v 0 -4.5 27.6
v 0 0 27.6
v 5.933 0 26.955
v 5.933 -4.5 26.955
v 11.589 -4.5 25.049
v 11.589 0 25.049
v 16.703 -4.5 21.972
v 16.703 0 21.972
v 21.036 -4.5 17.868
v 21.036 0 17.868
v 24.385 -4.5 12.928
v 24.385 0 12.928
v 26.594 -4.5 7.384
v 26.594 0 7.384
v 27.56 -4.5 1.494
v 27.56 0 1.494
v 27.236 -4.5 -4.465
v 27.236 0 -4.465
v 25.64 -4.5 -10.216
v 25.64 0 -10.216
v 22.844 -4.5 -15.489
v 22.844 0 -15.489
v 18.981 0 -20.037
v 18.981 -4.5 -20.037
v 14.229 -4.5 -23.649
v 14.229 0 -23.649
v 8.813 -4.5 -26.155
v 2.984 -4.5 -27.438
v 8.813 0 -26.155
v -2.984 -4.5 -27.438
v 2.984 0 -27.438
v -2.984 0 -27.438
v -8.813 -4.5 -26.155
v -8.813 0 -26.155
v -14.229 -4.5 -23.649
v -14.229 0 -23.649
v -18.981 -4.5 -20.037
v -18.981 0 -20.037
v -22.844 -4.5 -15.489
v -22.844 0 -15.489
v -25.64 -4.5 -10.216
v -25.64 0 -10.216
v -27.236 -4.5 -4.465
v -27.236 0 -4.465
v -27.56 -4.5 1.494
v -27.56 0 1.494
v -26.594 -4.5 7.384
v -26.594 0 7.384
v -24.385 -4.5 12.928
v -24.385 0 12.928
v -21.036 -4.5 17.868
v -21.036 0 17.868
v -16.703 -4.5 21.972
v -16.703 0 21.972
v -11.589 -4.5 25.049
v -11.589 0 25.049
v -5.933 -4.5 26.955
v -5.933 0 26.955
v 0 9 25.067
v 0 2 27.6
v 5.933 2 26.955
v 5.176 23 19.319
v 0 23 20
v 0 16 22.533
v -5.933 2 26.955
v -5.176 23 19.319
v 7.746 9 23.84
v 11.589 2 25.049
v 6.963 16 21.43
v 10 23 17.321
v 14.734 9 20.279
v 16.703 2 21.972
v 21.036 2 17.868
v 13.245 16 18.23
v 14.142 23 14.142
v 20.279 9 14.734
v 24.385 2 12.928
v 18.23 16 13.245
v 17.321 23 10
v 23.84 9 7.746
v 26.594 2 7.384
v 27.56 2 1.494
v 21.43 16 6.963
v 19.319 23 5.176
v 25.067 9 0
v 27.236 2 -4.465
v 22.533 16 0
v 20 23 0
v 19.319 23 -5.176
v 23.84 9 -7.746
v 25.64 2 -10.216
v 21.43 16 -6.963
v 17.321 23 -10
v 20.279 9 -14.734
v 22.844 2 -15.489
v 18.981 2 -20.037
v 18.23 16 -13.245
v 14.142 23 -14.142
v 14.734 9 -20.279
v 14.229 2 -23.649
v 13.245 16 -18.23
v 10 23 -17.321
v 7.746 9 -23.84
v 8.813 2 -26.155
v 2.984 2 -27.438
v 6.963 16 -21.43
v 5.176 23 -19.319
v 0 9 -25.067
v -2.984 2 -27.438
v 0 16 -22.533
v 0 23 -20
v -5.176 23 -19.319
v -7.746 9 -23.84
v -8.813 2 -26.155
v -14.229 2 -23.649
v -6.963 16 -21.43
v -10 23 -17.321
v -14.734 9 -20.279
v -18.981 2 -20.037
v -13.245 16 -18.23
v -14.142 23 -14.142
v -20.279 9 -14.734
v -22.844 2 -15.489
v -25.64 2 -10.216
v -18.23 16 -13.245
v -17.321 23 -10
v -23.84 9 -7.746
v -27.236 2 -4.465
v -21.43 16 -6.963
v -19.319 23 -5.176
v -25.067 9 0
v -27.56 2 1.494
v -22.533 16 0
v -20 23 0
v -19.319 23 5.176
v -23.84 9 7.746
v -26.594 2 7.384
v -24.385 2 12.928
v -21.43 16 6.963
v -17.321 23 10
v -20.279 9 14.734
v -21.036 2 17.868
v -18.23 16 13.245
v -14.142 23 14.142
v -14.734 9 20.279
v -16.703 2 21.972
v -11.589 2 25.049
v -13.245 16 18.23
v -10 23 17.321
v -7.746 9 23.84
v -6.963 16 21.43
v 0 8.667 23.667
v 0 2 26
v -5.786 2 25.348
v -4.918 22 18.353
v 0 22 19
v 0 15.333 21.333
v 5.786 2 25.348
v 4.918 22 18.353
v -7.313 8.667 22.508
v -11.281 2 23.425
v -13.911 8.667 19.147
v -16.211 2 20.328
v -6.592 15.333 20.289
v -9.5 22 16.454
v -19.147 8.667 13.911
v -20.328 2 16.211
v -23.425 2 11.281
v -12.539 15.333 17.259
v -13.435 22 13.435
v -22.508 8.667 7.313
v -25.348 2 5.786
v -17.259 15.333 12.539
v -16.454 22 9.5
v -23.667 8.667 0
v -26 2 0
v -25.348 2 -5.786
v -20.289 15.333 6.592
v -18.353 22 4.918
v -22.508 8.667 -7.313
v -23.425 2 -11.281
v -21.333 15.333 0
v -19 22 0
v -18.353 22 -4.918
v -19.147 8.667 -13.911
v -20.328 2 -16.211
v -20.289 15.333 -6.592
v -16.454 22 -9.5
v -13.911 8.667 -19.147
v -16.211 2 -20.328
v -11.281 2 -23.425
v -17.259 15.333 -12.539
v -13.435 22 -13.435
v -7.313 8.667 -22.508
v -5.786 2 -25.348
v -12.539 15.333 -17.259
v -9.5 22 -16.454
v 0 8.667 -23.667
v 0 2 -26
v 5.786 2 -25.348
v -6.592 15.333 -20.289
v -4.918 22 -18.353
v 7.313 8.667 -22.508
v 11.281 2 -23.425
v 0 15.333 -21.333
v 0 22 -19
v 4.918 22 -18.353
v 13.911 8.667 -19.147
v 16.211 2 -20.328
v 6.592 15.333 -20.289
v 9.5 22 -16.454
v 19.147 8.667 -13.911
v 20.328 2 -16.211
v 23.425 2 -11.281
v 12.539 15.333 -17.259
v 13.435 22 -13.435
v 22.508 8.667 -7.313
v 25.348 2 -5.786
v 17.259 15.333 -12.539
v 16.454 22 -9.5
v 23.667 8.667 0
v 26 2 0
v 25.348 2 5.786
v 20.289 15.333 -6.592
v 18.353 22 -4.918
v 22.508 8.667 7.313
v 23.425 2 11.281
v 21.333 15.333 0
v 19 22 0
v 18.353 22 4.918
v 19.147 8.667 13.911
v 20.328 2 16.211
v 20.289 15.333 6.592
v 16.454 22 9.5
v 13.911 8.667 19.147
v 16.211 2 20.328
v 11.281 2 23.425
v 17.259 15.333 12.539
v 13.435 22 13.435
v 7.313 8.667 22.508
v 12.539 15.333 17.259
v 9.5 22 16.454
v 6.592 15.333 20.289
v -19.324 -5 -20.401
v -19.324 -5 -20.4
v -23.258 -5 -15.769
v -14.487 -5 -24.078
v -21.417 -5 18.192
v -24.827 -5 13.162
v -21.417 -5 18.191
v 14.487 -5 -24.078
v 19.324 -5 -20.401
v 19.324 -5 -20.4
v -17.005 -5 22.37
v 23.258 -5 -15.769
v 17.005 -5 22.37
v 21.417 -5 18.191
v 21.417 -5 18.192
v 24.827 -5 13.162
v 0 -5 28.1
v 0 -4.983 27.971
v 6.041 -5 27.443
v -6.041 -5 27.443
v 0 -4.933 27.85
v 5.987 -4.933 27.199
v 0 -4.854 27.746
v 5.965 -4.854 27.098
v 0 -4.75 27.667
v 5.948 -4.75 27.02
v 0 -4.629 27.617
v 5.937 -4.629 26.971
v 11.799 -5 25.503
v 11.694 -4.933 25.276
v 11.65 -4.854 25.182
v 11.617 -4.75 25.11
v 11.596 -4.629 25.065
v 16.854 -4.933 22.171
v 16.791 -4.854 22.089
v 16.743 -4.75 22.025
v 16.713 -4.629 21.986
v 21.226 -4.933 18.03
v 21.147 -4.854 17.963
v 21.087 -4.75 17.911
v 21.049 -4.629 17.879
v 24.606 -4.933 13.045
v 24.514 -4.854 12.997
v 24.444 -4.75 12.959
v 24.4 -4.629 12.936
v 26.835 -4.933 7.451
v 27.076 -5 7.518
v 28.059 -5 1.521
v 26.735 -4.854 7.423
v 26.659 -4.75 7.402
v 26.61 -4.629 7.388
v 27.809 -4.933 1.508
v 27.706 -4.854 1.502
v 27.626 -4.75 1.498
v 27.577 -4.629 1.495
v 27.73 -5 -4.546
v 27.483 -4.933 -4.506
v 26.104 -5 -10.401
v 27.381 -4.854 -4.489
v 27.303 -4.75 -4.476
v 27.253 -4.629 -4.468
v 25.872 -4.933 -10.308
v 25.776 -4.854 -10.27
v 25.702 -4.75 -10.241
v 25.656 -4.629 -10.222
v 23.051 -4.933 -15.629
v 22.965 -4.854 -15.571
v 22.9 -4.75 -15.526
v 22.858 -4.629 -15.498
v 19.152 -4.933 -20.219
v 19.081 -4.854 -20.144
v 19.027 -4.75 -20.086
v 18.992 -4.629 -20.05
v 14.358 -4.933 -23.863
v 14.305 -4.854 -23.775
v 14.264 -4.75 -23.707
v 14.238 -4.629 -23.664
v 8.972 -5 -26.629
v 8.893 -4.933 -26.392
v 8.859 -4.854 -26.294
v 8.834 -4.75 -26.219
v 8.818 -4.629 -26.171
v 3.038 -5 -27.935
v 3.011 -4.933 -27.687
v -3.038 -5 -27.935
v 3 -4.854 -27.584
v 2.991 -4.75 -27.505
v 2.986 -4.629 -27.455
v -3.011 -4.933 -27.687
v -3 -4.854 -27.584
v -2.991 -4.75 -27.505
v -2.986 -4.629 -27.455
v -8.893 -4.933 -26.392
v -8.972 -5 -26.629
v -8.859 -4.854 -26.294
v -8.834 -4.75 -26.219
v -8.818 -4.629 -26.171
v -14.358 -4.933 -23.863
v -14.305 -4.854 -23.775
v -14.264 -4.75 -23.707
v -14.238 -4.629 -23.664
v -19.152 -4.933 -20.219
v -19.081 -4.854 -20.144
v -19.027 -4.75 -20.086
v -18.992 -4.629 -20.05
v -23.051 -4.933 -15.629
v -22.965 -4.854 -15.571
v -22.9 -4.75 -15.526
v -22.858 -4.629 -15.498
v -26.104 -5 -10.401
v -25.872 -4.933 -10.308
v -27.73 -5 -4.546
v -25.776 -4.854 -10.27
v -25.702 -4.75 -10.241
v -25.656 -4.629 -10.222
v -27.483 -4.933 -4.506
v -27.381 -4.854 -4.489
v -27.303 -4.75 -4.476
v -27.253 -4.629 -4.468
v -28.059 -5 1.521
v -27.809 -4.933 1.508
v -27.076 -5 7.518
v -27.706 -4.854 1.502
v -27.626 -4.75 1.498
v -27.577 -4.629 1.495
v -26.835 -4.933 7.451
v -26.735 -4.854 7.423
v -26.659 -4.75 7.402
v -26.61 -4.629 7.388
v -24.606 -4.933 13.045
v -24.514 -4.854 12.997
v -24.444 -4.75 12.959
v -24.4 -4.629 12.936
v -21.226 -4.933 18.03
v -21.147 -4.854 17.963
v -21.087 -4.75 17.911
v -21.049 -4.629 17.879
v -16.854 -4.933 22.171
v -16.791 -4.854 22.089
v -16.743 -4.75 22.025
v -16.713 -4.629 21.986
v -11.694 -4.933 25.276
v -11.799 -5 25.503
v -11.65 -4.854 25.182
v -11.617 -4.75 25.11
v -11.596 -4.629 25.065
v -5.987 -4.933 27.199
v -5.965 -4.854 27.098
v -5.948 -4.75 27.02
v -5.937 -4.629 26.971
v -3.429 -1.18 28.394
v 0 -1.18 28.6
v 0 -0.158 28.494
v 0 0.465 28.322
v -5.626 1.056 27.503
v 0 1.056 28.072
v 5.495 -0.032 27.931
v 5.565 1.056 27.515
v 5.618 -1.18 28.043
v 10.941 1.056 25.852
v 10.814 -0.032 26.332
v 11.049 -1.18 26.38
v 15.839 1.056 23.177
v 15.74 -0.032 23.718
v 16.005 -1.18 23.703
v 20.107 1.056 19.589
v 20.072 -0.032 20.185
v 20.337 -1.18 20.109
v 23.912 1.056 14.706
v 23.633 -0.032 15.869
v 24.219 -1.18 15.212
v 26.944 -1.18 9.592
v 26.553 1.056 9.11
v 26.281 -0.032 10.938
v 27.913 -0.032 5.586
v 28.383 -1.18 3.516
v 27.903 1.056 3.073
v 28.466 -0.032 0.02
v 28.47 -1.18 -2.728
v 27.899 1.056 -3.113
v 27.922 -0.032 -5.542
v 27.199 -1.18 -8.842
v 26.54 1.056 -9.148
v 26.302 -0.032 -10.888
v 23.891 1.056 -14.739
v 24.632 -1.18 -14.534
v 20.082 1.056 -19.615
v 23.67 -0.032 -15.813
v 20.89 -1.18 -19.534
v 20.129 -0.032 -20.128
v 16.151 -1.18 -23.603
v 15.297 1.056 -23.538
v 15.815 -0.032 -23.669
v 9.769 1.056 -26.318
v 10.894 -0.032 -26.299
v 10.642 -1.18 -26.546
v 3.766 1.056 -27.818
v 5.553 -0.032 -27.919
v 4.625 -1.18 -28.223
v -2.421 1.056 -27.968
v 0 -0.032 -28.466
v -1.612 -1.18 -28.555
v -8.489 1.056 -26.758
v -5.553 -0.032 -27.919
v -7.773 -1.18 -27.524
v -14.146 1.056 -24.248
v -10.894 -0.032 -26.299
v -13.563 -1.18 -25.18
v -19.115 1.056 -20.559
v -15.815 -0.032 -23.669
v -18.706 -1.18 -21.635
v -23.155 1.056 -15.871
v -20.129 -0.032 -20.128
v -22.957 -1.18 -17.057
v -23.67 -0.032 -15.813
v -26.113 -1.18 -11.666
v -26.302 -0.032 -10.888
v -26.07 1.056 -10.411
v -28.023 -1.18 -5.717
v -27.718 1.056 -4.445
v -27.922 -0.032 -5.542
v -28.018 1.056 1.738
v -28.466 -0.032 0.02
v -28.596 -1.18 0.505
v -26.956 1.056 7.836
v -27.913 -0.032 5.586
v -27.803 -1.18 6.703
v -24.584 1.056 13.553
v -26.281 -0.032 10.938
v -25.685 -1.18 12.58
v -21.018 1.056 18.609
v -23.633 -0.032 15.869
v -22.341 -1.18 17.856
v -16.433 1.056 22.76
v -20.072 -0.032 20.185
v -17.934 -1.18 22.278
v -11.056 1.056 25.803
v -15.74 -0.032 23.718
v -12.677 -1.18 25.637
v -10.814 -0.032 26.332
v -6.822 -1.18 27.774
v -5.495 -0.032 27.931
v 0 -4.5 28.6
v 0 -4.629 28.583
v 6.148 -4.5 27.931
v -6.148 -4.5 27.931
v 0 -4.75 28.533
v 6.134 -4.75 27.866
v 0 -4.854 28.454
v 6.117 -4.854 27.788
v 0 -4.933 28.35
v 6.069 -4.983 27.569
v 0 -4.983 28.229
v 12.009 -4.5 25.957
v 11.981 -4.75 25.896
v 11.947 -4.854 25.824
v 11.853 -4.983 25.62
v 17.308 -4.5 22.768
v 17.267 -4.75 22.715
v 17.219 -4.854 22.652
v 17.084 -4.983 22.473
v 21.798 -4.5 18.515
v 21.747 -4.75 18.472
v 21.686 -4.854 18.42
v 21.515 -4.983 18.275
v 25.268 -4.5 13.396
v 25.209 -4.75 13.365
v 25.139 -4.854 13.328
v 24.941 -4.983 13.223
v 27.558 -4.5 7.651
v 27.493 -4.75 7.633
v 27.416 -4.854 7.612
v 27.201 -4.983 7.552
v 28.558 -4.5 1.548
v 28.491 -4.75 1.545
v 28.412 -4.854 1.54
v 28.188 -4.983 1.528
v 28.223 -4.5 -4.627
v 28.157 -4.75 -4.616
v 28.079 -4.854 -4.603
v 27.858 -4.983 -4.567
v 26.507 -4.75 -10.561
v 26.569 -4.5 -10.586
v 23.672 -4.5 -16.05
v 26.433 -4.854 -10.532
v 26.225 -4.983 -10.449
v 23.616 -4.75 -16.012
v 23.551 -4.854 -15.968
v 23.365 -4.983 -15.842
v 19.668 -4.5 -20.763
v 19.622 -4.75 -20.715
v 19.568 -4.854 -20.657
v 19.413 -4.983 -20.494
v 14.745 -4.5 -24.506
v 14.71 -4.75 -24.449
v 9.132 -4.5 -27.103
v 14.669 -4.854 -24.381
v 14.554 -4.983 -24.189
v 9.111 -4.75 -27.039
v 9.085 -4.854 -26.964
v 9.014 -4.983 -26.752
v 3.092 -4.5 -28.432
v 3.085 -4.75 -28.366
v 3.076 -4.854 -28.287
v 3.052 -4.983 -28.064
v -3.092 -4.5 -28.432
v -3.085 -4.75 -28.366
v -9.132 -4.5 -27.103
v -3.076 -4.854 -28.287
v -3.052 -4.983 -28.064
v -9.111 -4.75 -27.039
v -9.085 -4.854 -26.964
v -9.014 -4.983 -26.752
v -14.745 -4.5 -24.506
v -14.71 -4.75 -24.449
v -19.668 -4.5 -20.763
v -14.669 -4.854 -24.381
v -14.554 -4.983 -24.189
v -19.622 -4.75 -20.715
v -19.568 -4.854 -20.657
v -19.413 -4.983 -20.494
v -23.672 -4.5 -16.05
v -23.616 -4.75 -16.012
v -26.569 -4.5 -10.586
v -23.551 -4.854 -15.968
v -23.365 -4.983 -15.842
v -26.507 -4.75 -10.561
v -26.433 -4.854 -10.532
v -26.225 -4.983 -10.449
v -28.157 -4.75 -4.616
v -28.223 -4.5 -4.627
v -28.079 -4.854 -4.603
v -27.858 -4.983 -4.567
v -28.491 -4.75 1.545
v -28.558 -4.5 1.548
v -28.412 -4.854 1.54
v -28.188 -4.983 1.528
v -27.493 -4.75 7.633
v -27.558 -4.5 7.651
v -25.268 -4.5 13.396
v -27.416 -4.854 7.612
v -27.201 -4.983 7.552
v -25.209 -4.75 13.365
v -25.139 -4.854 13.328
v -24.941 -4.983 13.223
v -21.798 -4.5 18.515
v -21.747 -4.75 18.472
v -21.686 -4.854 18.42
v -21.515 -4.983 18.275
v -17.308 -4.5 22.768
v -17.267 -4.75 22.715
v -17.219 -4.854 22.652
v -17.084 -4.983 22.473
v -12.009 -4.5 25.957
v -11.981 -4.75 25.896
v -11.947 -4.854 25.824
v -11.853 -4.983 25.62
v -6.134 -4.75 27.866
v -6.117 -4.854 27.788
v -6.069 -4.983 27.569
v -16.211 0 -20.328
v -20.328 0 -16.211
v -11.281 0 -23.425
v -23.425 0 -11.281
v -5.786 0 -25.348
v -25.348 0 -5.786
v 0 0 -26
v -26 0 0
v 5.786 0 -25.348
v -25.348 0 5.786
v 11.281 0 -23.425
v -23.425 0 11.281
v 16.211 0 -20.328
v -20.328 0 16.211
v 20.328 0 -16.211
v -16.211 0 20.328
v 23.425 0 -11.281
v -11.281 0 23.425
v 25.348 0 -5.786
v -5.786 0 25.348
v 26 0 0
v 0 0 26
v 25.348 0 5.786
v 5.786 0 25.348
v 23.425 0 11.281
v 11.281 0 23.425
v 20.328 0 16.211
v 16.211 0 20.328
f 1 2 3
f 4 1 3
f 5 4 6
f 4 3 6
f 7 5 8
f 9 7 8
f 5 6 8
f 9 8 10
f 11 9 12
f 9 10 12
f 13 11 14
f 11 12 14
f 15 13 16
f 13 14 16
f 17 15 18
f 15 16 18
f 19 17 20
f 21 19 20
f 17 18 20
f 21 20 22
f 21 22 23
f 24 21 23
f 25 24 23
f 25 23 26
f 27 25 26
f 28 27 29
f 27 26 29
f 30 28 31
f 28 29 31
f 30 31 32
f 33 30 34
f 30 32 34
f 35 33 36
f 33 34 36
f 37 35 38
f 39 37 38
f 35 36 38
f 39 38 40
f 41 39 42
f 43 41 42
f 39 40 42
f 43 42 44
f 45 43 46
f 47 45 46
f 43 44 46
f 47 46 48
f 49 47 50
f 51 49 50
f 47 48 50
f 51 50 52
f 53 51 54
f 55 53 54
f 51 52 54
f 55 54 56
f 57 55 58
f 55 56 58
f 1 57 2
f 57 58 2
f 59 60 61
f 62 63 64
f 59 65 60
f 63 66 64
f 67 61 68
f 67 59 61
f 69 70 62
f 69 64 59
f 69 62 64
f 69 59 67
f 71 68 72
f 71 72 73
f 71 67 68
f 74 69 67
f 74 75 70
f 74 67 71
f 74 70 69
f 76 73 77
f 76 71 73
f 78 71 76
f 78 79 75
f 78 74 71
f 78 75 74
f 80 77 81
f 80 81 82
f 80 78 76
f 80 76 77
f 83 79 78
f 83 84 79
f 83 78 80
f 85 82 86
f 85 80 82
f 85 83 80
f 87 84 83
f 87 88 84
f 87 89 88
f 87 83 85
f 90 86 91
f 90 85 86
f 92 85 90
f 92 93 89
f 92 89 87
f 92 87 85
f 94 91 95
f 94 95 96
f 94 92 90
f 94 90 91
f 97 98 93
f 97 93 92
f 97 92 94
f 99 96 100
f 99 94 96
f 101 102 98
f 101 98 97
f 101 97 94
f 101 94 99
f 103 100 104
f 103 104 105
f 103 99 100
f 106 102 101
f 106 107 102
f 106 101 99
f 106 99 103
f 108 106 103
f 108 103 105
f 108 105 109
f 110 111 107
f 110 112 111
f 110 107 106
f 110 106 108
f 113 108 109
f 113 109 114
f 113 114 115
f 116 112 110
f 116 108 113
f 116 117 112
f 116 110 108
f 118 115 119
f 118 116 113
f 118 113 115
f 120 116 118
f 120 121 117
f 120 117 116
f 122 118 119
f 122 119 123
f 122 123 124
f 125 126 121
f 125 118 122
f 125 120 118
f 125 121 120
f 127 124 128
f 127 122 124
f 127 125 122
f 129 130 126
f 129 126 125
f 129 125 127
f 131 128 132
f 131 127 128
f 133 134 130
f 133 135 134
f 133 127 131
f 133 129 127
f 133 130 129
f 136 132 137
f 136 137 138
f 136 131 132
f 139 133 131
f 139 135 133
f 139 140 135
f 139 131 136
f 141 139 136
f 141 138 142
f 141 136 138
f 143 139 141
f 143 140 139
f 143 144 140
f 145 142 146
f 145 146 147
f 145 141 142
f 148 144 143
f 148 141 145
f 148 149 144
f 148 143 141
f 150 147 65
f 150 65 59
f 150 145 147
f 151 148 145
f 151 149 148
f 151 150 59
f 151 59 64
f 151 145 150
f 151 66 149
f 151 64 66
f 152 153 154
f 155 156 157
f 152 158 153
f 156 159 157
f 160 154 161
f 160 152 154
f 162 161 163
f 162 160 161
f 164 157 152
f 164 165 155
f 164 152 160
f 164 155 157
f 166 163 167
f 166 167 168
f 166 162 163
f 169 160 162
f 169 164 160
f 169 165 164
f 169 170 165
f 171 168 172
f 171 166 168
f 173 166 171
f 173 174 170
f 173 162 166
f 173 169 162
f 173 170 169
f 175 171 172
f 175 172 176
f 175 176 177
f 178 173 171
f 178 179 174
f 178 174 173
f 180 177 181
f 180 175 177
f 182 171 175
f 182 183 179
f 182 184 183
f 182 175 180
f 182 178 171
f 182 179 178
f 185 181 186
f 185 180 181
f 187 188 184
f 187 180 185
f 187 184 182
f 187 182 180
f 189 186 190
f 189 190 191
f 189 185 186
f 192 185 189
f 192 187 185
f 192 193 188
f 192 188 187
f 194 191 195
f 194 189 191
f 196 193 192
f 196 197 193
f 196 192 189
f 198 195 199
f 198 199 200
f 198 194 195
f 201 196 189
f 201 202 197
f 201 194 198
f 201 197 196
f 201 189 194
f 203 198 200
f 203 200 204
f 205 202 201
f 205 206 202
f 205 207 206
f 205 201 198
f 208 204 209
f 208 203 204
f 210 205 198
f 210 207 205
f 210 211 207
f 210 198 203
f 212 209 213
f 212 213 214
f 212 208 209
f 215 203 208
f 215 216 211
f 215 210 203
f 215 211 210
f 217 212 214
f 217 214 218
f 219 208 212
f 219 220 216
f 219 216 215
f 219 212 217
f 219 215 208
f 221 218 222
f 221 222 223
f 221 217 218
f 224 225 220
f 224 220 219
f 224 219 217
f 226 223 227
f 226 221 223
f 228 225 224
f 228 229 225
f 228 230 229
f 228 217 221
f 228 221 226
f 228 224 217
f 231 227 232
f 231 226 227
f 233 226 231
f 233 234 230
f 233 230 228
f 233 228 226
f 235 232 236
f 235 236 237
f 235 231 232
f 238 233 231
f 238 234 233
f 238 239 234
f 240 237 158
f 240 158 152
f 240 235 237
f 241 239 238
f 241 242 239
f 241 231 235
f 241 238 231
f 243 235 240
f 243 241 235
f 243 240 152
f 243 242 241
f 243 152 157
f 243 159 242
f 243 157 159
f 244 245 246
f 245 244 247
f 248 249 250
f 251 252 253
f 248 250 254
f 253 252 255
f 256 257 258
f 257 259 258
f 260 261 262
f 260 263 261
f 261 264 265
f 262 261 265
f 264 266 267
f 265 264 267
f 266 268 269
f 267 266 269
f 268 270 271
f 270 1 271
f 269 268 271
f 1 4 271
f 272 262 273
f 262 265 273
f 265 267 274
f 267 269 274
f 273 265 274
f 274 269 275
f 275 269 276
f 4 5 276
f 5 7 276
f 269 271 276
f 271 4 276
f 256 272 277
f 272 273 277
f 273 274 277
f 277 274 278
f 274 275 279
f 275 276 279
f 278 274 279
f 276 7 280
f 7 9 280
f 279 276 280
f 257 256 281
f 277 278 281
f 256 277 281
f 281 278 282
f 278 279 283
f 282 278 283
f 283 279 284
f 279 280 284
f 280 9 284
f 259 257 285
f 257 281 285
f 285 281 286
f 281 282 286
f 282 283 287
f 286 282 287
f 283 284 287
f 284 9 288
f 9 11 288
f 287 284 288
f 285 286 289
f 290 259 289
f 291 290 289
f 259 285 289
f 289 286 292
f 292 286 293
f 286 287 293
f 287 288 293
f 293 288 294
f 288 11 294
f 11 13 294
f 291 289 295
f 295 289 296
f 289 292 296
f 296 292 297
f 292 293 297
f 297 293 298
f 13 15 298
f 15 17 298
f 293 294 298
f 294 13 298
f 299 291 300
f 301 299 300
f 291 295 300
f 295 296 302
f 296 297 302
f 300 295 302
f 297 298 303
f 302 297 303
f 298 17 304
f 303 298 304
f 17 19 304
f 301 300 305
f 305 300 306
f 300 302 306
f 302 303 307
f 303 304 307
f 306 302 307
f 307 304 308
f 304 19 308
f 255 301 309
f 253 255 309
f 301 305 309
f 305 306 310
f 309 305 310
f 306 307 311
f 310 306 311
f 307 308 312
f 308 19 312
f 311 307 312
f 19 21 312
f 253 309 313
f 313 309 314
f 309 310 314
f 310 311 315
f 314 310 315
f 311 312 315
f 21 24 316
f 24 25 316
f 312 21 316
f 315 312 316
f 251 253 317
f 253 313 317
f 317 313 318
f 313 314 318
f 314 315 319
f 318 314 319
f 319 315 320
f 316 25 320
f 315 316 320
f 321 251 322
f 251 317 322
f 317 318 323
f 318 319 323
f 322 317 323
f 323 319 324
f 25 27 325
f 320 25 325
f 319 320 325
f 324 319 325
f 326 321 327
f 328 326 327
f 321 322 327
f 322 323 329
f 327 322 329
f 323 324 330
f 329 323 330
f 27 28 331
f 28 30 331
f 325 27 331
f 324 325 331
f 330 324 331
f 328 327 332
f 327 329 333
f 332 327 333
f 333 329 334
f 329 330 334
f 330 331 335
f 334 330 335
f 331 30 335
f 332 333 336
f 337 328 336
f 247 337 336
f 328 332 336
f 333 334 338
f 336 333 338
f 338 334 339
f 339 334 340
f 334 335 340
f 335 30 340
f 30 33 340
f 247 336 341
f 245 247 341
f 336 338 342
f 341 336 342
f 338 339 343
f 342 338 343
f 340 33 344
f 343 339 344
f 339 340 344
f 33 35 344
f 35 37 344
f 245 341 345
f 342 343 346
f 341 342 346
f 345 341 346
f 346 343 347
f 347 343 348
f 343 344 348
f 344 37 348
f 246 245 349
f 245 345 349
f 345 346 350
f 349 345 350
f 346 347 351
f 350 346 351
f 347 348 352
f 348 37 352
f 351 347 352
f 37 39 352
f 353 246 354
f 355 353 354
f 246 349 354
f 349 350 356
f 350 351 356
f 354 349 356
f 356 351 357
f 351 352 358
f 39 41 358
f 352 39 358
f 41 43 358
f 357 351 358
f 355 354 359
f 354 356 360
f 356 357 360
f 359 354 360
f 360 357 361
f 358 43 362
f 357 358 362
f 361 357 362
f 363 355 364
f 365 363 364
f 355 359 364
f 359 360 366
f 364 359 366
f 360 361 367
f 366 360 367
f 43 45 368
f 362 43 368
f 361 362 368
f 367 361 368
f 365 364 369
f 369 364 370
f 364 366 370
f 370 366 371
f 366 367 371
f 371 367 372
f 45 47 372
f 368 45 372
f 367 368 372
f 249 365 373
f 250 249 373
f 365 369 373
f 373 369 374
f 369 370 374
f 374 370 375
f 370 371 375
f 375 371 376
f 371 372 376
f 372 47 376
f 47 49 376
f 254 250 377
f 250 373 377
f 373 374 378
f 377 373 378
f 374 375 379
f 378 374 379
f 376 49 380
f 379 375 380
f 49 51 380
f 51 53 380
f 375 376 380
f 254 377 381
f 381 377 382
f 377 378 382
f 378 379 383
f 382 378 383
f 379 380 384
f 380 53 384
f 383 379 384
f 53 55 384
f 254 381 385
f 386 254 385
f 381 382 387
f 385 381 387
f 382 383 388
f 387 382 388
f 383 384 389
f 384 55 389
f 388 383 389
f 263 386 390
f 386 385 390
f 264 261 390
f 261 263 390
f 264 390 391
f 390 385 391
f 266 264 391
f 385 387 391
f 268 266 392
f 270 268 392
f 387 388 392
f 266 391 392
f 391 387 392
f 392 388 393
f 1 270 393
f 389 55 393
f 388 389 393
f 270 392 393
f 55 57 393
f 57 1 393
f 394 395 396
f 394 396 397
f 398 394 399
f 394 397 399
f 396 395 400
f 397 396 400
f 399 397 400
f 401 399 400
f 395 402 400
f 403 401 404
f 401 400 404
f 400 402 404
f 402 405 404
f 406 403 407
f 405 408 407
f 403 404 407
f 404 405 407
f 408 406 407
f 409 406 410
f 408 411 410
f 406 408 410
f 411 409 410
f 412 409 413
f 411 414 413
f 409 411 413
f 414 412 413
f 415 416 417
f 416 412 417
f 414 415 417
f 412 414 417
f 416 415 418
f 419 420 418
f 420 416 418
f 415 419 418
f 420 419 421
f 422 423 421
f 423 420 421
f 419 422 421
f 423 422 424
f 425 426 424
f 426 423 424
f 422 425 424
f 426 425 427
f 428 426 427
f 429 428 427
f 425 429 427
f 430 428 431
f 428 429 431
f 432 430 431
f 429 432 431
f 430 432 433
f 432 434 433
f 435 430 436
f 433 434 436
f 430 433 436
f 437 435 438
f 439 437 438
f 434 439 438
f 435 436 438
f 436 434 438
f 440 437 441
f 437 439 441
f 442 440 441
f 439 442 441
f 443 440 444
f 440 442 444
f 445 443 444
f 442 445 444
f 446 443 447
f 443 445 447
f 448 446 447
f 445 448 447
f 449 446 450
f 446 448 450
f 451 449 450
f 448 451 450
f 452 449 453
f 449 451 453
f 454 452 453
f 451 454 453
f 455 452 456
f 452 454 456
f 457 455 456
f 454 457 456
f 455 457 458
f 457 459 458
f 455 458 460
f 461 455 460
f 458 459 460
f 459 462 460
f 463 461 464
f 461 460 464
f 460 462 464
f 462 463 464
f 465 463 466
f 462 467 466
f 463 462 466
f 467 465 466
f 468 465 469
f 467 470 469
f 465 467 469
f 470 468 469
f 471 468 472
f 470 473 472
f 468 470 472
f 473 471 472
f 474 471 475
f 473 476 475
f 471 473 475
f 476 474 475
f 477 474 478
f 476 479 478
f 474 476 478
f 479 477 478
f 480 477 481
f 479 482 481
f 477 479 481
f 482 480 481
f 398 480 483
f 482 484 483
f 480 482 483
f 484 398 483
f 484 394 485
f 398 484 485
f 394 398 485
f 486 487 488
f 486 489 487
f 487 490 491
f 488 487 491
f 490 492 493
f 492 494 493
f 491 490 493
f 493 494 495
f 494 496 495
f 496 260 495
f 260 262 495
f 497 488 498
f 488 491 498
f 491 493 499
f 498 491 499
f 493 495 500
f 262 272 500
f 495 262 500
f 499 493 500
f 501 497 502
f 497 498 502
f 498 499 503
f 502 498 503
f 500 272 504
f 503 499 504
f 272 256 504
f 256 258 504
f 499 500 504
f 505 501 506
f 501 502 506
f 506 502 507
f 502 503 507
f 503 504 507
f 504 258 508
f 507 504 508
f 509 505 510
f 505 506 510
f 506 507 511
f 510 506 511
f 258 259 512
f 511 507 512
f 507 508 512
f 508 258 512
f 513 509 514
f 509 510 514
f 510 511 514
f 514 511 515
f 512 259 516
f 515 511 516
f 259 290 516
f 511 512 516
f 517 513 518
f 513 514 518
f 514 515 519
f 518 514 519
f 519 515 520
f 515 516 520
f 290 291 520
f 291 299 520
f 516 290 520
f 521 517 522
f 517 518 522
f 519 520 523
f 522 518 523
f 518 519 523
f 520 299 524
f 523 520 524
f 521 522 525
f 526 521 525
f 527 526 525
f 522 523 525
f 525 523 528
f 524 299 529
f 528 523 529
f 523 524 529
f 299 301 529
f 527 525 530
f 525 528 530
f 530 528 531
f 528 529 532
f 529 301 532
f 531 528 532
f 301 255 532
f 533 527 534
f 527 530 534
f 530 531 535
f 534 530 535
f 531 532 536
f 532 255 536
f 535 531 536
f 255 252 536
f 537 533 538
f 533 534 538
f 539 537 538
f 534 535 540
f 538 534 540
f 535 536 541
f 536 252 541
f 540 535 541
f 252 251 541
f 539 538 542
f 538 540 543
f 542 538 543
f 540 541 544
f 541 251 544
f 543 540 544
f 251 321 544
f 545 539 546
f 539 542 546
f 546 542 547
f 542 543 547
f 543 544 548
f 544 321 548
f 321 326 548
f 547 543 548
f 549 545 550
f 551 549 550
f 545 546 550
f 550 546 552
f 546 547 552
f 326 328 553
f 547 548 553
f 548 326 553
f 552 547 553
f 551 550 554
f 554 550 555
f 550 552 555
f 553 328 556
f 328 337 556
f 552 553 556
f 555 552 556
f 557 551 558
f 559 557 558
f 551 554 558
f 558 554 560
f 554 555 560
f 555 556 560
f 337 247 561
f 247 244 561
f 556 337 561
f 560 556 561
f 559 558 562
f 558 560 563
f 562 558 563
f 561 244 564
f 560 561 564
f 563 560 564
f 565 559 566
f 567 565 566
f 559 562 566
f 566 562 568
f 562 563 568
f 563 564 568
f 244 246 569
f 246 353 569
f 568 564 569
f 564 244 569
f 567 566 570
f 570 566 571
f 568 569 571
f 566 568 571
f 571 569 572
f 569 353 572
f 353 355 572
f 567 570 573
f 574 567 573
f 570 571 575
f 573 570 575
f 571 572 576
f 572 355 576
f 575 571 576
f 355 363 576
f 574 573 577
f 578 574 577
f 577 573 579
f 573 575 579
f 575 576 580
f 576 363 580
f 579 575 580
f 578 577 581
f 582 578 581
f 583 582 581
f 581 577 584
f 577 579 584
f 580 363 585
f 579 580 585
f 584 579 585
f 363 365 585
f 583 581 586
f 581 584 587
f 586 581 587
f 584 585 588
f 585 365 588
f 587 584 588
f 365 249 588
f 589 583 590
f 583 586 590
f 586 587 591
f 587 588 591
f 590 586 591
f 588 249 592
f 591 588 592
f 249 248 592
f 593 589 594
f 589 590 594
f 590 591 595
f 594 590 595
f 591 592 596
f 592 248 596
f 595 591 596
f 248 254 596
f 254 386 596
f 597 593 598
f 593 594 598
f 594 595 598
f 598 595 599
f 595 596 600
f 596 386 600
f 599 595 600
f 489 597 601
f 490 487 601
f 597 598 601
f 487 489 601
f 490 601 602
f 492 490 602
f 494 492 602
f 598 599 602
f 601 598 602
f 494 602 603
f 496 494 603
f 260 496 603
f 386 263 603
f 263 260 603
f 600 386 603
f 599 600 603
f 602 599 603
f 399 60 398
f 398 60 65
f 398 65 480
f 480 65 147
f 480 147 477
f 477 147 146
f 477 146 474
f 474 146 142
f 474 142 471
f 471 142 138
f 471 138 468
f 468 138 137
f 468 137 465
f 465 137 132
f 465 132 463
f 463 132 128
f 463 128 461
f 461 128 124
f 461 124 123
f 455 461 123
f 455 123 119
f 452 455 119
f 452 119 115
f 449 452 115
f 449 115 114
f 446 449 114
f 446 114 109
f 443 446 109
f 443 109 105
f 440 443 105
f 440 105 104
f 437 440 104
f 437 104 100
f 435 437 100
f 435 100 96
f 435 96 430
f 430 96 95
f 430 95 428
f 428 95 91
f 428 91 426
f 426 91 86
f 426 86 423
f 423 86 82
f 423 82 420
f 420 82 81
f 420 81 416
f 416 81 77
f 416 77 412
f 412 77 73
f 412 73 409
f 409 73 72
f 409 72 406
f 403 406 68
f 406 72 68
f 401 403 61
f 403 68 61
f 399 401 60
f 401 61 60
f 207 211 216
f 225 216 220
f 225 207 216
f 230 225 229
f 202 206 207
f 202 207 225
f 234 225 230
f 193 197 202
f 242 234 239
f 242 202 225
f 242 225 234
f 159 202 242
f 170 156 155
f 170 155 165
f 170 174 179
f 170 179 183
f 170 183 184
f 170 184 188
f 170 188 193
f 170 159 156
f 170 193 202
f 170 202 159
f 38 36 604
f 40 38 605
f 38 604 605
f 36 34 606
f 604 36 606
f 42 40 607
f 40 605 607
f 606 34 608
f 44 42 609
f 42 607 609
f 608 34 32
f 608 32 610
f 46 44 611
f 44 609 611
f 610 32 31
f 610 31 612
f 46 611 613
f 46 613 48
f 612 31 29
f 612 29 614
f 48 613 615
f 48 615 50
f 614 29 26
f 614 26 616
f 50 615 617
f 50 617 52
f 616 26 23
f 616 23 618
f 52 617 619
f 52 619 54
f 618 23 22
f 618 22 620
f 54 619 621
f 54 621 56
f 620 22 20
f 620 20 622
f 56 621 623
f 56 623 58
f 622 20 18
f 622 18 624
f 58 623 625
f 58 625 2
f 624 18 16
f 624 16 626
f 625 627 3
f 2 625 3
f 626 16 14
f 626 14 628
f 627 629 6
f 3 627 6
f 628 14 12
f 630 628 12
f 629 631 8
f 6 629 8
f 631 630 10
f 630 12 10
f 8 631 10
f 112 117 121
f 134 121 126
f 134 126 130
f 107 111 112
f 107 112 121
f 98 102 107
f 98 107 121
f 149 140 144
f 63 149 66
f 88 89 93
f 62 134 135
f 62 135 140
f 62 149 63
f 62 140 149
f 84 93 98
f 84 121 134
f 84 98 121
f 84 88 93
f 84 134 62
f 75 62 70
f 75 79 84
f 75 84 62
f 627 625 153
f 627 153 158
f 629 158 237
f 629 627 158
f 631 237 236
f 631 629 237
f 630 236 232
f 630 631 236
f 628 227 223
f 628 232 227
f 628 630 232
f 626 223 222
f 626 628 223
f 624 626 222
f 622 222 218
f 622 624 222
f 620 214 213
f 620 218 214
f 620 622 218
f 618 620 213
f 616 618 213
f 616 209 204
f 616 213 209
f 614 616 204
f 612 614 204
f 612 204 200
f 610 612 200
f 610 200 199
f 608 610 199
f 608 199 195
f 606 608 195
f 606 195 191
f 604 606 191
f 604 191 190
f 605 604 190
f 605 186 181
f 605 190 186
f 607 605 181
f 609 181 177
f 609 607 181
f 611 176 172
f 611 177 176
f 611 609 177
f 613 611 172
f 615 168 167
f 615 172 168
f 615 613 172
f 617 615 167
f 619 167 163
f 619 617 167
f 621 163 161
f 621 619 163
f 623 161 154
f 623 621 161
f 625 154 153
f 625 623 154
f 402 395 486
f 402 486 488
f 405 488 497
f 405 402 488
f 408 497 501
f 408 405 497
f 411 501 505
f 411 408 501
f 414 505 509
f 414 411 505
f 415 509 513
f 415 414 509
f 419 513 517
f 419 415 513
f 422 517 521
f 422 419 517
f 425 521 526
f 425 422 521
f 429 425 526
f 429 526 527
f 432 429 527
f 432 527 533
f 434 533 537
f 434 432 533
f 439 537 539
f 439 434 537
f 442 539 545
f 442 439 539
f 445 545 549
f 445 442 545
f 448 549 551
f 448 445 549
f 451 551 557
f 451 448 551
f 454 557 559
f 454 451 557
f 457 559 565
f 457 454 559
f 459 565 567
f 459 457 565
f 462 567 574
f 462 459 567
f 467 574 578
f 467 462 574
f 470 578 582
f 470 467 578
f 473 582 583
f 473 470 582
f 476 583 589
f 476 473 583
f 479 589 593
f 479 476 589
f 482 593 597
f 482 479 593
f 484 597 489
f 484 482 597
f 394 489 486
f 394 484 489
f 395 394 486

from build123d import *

# Parameters (mm, degrees)
SKETCH33_R          = 28.6
SKETCH33_R_2        = 27.6
BOSS_EXTRUDE7_DEPTH = 5
BOSS_EXTRUDE8_START = 22
SKETCH33_11_R       = 20
BOSS_EXTRUDE8_DEPTH = 1
SKETCH33_12_R       = 27.6
SKETCH33_12_R_2     = 26
BOSS_EXTRUDE9_DEPTH = 2
SKETCH33_14_R       = 26
SKETCH33_14_R_2     = 20
CUT_EXTRUDE1_DEPTH  = 4.5
FILLET1_R           = 0.5
FILLET3_R           = 5


with BuildPart() as part:
    # Sketch33 → Boss-Extrude7 (new body)
    with BuildSketch(Plane(origin=(0, 0, 0), x_dir=(1, 0, 0), z_dir=(0, 1, 0))):
        with Locations(Location((0, 0, 0), (0, 0, 270))):
            Circle(SKETCH33_R)
        with Locations(Location((0, 0, 0), (0, 0, 270))):
            Circle(SKETCH33_R_2, mode=Mode.SUBTRACT)
    extrude(amount=-BOSS_EXTRUDE7_DEPTH)



with BuildPart() as body_2:
    # Sketch33<11> → Boss-Extrude8 (new body)
    with BuildSketch(Plane(origin=(0, 0, 0), x_dir=(1, 0, 0), z_dir=(0, 1, 0)).offset(BOSS_EXTRUDE8_START)):
        with Locations(Location((0, 0, 0), (0, 0, 270))):
            Circle(SKETCH33_11_R)
    extrude(amount=BOSS_EXTRUDE8_DEPTH)


with BuildPart() as body_3:
    # Sketch33<12> → Boss-Extrude9 (new body)
    with BuildSketch(Plane(origin=(0, 0, 0), x_dir=(1, 0, 0), z_dir=(0, 1, 0))):
        with Locations(Location((0, 0, 0), (0, 0, 270))):
            Circle(SKETCH33_12_R)
        with Locations(Location((0, 0, 0), (0, 0, 270))):
            Circle(SKETCH33_12_R_2, mode=Mode.SUBTRACT)
    extrude(amount=BOSS_EXTRUDE9_DEPTH)


with BuildPart() as part_1:
    add(part.part)

    add(body_3.part)  # loft5 joins it to this body
    # loft up to a face of the part (loft5)
    loft([Face(Wire([part_1.edges().sort_by_distance((20.848502744, 0, -19.57804723))[0]])), Face(Wire([part_1.edges().sort_by_distance((20.119534117, 2, -18.893500124))[0]]))])

    # Sketch33<14> → Cut-Extrude1 (cut)
    # profile 1 of 2: a face of its own
    with BuildSketch(Plane(origin=(0, 0, 0), x_dir=(1, 0, 0), z_dir=(0, 1, 0))):
        with Locations(Location((0, 0, 0), (0, 0, 270))):
            Circle(SKETCH33_14_R)
        with Locations(Location((0, 0, 0), (0, 0, 270))):
            Circle(SKETCH33_14_R_2, mode=Mode.SUBTRACT)
    # profile 2 of 2: a face of its own
    with BuildSketch(Plane(origin=(0, 0, 0), x_dir=(1, 0, 0), z_dir=(0, 1, 0))):
        with Locations(Location((0, 0, 0), (0, 0, 270))):
            Circle(SKETCH33_14_R_2)
    extrude(amount=CUT_EXTRUDE1_DEPTH, mode=Mode.SUBTRACT)


    add(body_2.part)  # loft6 joins it to this body
    # loft up to a face of the part (loft6)
    loft([Face(Wire([part_1.edges().sort_by_distance((20.119534117, 2, -18.893500124))[0]])), Face(Wire([part_1.edges().sort_by_distance((14.579372548, 23, -13.690942119))[0]]))])

    # Sketch35 → Cut-Revolve4 (revolve, cut)
    with BuildSketch(Plane.XY, mode=Mode.PRIVATE) as cut_revolve4_sk:
        Polygon((-26, 2), (-19, 22), (0, 22), (0, 2), align=None)
    revolve(cut_revolve4_sk.sketch.rotate(Axis((0, 22, 0), (0, -1, 0)), 270), axis=Axis((0, 22, 0), (0, -1, 0)), mode=Mode.SUBTRACT)

    # Fillet1
    fillet1_edges = [part_1.edges().sort_by_distance(p)[0] for p in [
        (0, -5, -28.6),
        (0, -5, -27.6),
    ]]
    fillet(fillet1_edges, radius=FILLET1_R - 0.0001)  # a hair under: the kernel refuses the full size

    # Fillet3
    fillet3_edges = [part_1.edges().sort_by_distance(p)[0] for p in [
        (0, 0, -28.6),
    ]]
    fillet(fillet3_edges, radius=FILLET3_R)


solid = part_1.part
